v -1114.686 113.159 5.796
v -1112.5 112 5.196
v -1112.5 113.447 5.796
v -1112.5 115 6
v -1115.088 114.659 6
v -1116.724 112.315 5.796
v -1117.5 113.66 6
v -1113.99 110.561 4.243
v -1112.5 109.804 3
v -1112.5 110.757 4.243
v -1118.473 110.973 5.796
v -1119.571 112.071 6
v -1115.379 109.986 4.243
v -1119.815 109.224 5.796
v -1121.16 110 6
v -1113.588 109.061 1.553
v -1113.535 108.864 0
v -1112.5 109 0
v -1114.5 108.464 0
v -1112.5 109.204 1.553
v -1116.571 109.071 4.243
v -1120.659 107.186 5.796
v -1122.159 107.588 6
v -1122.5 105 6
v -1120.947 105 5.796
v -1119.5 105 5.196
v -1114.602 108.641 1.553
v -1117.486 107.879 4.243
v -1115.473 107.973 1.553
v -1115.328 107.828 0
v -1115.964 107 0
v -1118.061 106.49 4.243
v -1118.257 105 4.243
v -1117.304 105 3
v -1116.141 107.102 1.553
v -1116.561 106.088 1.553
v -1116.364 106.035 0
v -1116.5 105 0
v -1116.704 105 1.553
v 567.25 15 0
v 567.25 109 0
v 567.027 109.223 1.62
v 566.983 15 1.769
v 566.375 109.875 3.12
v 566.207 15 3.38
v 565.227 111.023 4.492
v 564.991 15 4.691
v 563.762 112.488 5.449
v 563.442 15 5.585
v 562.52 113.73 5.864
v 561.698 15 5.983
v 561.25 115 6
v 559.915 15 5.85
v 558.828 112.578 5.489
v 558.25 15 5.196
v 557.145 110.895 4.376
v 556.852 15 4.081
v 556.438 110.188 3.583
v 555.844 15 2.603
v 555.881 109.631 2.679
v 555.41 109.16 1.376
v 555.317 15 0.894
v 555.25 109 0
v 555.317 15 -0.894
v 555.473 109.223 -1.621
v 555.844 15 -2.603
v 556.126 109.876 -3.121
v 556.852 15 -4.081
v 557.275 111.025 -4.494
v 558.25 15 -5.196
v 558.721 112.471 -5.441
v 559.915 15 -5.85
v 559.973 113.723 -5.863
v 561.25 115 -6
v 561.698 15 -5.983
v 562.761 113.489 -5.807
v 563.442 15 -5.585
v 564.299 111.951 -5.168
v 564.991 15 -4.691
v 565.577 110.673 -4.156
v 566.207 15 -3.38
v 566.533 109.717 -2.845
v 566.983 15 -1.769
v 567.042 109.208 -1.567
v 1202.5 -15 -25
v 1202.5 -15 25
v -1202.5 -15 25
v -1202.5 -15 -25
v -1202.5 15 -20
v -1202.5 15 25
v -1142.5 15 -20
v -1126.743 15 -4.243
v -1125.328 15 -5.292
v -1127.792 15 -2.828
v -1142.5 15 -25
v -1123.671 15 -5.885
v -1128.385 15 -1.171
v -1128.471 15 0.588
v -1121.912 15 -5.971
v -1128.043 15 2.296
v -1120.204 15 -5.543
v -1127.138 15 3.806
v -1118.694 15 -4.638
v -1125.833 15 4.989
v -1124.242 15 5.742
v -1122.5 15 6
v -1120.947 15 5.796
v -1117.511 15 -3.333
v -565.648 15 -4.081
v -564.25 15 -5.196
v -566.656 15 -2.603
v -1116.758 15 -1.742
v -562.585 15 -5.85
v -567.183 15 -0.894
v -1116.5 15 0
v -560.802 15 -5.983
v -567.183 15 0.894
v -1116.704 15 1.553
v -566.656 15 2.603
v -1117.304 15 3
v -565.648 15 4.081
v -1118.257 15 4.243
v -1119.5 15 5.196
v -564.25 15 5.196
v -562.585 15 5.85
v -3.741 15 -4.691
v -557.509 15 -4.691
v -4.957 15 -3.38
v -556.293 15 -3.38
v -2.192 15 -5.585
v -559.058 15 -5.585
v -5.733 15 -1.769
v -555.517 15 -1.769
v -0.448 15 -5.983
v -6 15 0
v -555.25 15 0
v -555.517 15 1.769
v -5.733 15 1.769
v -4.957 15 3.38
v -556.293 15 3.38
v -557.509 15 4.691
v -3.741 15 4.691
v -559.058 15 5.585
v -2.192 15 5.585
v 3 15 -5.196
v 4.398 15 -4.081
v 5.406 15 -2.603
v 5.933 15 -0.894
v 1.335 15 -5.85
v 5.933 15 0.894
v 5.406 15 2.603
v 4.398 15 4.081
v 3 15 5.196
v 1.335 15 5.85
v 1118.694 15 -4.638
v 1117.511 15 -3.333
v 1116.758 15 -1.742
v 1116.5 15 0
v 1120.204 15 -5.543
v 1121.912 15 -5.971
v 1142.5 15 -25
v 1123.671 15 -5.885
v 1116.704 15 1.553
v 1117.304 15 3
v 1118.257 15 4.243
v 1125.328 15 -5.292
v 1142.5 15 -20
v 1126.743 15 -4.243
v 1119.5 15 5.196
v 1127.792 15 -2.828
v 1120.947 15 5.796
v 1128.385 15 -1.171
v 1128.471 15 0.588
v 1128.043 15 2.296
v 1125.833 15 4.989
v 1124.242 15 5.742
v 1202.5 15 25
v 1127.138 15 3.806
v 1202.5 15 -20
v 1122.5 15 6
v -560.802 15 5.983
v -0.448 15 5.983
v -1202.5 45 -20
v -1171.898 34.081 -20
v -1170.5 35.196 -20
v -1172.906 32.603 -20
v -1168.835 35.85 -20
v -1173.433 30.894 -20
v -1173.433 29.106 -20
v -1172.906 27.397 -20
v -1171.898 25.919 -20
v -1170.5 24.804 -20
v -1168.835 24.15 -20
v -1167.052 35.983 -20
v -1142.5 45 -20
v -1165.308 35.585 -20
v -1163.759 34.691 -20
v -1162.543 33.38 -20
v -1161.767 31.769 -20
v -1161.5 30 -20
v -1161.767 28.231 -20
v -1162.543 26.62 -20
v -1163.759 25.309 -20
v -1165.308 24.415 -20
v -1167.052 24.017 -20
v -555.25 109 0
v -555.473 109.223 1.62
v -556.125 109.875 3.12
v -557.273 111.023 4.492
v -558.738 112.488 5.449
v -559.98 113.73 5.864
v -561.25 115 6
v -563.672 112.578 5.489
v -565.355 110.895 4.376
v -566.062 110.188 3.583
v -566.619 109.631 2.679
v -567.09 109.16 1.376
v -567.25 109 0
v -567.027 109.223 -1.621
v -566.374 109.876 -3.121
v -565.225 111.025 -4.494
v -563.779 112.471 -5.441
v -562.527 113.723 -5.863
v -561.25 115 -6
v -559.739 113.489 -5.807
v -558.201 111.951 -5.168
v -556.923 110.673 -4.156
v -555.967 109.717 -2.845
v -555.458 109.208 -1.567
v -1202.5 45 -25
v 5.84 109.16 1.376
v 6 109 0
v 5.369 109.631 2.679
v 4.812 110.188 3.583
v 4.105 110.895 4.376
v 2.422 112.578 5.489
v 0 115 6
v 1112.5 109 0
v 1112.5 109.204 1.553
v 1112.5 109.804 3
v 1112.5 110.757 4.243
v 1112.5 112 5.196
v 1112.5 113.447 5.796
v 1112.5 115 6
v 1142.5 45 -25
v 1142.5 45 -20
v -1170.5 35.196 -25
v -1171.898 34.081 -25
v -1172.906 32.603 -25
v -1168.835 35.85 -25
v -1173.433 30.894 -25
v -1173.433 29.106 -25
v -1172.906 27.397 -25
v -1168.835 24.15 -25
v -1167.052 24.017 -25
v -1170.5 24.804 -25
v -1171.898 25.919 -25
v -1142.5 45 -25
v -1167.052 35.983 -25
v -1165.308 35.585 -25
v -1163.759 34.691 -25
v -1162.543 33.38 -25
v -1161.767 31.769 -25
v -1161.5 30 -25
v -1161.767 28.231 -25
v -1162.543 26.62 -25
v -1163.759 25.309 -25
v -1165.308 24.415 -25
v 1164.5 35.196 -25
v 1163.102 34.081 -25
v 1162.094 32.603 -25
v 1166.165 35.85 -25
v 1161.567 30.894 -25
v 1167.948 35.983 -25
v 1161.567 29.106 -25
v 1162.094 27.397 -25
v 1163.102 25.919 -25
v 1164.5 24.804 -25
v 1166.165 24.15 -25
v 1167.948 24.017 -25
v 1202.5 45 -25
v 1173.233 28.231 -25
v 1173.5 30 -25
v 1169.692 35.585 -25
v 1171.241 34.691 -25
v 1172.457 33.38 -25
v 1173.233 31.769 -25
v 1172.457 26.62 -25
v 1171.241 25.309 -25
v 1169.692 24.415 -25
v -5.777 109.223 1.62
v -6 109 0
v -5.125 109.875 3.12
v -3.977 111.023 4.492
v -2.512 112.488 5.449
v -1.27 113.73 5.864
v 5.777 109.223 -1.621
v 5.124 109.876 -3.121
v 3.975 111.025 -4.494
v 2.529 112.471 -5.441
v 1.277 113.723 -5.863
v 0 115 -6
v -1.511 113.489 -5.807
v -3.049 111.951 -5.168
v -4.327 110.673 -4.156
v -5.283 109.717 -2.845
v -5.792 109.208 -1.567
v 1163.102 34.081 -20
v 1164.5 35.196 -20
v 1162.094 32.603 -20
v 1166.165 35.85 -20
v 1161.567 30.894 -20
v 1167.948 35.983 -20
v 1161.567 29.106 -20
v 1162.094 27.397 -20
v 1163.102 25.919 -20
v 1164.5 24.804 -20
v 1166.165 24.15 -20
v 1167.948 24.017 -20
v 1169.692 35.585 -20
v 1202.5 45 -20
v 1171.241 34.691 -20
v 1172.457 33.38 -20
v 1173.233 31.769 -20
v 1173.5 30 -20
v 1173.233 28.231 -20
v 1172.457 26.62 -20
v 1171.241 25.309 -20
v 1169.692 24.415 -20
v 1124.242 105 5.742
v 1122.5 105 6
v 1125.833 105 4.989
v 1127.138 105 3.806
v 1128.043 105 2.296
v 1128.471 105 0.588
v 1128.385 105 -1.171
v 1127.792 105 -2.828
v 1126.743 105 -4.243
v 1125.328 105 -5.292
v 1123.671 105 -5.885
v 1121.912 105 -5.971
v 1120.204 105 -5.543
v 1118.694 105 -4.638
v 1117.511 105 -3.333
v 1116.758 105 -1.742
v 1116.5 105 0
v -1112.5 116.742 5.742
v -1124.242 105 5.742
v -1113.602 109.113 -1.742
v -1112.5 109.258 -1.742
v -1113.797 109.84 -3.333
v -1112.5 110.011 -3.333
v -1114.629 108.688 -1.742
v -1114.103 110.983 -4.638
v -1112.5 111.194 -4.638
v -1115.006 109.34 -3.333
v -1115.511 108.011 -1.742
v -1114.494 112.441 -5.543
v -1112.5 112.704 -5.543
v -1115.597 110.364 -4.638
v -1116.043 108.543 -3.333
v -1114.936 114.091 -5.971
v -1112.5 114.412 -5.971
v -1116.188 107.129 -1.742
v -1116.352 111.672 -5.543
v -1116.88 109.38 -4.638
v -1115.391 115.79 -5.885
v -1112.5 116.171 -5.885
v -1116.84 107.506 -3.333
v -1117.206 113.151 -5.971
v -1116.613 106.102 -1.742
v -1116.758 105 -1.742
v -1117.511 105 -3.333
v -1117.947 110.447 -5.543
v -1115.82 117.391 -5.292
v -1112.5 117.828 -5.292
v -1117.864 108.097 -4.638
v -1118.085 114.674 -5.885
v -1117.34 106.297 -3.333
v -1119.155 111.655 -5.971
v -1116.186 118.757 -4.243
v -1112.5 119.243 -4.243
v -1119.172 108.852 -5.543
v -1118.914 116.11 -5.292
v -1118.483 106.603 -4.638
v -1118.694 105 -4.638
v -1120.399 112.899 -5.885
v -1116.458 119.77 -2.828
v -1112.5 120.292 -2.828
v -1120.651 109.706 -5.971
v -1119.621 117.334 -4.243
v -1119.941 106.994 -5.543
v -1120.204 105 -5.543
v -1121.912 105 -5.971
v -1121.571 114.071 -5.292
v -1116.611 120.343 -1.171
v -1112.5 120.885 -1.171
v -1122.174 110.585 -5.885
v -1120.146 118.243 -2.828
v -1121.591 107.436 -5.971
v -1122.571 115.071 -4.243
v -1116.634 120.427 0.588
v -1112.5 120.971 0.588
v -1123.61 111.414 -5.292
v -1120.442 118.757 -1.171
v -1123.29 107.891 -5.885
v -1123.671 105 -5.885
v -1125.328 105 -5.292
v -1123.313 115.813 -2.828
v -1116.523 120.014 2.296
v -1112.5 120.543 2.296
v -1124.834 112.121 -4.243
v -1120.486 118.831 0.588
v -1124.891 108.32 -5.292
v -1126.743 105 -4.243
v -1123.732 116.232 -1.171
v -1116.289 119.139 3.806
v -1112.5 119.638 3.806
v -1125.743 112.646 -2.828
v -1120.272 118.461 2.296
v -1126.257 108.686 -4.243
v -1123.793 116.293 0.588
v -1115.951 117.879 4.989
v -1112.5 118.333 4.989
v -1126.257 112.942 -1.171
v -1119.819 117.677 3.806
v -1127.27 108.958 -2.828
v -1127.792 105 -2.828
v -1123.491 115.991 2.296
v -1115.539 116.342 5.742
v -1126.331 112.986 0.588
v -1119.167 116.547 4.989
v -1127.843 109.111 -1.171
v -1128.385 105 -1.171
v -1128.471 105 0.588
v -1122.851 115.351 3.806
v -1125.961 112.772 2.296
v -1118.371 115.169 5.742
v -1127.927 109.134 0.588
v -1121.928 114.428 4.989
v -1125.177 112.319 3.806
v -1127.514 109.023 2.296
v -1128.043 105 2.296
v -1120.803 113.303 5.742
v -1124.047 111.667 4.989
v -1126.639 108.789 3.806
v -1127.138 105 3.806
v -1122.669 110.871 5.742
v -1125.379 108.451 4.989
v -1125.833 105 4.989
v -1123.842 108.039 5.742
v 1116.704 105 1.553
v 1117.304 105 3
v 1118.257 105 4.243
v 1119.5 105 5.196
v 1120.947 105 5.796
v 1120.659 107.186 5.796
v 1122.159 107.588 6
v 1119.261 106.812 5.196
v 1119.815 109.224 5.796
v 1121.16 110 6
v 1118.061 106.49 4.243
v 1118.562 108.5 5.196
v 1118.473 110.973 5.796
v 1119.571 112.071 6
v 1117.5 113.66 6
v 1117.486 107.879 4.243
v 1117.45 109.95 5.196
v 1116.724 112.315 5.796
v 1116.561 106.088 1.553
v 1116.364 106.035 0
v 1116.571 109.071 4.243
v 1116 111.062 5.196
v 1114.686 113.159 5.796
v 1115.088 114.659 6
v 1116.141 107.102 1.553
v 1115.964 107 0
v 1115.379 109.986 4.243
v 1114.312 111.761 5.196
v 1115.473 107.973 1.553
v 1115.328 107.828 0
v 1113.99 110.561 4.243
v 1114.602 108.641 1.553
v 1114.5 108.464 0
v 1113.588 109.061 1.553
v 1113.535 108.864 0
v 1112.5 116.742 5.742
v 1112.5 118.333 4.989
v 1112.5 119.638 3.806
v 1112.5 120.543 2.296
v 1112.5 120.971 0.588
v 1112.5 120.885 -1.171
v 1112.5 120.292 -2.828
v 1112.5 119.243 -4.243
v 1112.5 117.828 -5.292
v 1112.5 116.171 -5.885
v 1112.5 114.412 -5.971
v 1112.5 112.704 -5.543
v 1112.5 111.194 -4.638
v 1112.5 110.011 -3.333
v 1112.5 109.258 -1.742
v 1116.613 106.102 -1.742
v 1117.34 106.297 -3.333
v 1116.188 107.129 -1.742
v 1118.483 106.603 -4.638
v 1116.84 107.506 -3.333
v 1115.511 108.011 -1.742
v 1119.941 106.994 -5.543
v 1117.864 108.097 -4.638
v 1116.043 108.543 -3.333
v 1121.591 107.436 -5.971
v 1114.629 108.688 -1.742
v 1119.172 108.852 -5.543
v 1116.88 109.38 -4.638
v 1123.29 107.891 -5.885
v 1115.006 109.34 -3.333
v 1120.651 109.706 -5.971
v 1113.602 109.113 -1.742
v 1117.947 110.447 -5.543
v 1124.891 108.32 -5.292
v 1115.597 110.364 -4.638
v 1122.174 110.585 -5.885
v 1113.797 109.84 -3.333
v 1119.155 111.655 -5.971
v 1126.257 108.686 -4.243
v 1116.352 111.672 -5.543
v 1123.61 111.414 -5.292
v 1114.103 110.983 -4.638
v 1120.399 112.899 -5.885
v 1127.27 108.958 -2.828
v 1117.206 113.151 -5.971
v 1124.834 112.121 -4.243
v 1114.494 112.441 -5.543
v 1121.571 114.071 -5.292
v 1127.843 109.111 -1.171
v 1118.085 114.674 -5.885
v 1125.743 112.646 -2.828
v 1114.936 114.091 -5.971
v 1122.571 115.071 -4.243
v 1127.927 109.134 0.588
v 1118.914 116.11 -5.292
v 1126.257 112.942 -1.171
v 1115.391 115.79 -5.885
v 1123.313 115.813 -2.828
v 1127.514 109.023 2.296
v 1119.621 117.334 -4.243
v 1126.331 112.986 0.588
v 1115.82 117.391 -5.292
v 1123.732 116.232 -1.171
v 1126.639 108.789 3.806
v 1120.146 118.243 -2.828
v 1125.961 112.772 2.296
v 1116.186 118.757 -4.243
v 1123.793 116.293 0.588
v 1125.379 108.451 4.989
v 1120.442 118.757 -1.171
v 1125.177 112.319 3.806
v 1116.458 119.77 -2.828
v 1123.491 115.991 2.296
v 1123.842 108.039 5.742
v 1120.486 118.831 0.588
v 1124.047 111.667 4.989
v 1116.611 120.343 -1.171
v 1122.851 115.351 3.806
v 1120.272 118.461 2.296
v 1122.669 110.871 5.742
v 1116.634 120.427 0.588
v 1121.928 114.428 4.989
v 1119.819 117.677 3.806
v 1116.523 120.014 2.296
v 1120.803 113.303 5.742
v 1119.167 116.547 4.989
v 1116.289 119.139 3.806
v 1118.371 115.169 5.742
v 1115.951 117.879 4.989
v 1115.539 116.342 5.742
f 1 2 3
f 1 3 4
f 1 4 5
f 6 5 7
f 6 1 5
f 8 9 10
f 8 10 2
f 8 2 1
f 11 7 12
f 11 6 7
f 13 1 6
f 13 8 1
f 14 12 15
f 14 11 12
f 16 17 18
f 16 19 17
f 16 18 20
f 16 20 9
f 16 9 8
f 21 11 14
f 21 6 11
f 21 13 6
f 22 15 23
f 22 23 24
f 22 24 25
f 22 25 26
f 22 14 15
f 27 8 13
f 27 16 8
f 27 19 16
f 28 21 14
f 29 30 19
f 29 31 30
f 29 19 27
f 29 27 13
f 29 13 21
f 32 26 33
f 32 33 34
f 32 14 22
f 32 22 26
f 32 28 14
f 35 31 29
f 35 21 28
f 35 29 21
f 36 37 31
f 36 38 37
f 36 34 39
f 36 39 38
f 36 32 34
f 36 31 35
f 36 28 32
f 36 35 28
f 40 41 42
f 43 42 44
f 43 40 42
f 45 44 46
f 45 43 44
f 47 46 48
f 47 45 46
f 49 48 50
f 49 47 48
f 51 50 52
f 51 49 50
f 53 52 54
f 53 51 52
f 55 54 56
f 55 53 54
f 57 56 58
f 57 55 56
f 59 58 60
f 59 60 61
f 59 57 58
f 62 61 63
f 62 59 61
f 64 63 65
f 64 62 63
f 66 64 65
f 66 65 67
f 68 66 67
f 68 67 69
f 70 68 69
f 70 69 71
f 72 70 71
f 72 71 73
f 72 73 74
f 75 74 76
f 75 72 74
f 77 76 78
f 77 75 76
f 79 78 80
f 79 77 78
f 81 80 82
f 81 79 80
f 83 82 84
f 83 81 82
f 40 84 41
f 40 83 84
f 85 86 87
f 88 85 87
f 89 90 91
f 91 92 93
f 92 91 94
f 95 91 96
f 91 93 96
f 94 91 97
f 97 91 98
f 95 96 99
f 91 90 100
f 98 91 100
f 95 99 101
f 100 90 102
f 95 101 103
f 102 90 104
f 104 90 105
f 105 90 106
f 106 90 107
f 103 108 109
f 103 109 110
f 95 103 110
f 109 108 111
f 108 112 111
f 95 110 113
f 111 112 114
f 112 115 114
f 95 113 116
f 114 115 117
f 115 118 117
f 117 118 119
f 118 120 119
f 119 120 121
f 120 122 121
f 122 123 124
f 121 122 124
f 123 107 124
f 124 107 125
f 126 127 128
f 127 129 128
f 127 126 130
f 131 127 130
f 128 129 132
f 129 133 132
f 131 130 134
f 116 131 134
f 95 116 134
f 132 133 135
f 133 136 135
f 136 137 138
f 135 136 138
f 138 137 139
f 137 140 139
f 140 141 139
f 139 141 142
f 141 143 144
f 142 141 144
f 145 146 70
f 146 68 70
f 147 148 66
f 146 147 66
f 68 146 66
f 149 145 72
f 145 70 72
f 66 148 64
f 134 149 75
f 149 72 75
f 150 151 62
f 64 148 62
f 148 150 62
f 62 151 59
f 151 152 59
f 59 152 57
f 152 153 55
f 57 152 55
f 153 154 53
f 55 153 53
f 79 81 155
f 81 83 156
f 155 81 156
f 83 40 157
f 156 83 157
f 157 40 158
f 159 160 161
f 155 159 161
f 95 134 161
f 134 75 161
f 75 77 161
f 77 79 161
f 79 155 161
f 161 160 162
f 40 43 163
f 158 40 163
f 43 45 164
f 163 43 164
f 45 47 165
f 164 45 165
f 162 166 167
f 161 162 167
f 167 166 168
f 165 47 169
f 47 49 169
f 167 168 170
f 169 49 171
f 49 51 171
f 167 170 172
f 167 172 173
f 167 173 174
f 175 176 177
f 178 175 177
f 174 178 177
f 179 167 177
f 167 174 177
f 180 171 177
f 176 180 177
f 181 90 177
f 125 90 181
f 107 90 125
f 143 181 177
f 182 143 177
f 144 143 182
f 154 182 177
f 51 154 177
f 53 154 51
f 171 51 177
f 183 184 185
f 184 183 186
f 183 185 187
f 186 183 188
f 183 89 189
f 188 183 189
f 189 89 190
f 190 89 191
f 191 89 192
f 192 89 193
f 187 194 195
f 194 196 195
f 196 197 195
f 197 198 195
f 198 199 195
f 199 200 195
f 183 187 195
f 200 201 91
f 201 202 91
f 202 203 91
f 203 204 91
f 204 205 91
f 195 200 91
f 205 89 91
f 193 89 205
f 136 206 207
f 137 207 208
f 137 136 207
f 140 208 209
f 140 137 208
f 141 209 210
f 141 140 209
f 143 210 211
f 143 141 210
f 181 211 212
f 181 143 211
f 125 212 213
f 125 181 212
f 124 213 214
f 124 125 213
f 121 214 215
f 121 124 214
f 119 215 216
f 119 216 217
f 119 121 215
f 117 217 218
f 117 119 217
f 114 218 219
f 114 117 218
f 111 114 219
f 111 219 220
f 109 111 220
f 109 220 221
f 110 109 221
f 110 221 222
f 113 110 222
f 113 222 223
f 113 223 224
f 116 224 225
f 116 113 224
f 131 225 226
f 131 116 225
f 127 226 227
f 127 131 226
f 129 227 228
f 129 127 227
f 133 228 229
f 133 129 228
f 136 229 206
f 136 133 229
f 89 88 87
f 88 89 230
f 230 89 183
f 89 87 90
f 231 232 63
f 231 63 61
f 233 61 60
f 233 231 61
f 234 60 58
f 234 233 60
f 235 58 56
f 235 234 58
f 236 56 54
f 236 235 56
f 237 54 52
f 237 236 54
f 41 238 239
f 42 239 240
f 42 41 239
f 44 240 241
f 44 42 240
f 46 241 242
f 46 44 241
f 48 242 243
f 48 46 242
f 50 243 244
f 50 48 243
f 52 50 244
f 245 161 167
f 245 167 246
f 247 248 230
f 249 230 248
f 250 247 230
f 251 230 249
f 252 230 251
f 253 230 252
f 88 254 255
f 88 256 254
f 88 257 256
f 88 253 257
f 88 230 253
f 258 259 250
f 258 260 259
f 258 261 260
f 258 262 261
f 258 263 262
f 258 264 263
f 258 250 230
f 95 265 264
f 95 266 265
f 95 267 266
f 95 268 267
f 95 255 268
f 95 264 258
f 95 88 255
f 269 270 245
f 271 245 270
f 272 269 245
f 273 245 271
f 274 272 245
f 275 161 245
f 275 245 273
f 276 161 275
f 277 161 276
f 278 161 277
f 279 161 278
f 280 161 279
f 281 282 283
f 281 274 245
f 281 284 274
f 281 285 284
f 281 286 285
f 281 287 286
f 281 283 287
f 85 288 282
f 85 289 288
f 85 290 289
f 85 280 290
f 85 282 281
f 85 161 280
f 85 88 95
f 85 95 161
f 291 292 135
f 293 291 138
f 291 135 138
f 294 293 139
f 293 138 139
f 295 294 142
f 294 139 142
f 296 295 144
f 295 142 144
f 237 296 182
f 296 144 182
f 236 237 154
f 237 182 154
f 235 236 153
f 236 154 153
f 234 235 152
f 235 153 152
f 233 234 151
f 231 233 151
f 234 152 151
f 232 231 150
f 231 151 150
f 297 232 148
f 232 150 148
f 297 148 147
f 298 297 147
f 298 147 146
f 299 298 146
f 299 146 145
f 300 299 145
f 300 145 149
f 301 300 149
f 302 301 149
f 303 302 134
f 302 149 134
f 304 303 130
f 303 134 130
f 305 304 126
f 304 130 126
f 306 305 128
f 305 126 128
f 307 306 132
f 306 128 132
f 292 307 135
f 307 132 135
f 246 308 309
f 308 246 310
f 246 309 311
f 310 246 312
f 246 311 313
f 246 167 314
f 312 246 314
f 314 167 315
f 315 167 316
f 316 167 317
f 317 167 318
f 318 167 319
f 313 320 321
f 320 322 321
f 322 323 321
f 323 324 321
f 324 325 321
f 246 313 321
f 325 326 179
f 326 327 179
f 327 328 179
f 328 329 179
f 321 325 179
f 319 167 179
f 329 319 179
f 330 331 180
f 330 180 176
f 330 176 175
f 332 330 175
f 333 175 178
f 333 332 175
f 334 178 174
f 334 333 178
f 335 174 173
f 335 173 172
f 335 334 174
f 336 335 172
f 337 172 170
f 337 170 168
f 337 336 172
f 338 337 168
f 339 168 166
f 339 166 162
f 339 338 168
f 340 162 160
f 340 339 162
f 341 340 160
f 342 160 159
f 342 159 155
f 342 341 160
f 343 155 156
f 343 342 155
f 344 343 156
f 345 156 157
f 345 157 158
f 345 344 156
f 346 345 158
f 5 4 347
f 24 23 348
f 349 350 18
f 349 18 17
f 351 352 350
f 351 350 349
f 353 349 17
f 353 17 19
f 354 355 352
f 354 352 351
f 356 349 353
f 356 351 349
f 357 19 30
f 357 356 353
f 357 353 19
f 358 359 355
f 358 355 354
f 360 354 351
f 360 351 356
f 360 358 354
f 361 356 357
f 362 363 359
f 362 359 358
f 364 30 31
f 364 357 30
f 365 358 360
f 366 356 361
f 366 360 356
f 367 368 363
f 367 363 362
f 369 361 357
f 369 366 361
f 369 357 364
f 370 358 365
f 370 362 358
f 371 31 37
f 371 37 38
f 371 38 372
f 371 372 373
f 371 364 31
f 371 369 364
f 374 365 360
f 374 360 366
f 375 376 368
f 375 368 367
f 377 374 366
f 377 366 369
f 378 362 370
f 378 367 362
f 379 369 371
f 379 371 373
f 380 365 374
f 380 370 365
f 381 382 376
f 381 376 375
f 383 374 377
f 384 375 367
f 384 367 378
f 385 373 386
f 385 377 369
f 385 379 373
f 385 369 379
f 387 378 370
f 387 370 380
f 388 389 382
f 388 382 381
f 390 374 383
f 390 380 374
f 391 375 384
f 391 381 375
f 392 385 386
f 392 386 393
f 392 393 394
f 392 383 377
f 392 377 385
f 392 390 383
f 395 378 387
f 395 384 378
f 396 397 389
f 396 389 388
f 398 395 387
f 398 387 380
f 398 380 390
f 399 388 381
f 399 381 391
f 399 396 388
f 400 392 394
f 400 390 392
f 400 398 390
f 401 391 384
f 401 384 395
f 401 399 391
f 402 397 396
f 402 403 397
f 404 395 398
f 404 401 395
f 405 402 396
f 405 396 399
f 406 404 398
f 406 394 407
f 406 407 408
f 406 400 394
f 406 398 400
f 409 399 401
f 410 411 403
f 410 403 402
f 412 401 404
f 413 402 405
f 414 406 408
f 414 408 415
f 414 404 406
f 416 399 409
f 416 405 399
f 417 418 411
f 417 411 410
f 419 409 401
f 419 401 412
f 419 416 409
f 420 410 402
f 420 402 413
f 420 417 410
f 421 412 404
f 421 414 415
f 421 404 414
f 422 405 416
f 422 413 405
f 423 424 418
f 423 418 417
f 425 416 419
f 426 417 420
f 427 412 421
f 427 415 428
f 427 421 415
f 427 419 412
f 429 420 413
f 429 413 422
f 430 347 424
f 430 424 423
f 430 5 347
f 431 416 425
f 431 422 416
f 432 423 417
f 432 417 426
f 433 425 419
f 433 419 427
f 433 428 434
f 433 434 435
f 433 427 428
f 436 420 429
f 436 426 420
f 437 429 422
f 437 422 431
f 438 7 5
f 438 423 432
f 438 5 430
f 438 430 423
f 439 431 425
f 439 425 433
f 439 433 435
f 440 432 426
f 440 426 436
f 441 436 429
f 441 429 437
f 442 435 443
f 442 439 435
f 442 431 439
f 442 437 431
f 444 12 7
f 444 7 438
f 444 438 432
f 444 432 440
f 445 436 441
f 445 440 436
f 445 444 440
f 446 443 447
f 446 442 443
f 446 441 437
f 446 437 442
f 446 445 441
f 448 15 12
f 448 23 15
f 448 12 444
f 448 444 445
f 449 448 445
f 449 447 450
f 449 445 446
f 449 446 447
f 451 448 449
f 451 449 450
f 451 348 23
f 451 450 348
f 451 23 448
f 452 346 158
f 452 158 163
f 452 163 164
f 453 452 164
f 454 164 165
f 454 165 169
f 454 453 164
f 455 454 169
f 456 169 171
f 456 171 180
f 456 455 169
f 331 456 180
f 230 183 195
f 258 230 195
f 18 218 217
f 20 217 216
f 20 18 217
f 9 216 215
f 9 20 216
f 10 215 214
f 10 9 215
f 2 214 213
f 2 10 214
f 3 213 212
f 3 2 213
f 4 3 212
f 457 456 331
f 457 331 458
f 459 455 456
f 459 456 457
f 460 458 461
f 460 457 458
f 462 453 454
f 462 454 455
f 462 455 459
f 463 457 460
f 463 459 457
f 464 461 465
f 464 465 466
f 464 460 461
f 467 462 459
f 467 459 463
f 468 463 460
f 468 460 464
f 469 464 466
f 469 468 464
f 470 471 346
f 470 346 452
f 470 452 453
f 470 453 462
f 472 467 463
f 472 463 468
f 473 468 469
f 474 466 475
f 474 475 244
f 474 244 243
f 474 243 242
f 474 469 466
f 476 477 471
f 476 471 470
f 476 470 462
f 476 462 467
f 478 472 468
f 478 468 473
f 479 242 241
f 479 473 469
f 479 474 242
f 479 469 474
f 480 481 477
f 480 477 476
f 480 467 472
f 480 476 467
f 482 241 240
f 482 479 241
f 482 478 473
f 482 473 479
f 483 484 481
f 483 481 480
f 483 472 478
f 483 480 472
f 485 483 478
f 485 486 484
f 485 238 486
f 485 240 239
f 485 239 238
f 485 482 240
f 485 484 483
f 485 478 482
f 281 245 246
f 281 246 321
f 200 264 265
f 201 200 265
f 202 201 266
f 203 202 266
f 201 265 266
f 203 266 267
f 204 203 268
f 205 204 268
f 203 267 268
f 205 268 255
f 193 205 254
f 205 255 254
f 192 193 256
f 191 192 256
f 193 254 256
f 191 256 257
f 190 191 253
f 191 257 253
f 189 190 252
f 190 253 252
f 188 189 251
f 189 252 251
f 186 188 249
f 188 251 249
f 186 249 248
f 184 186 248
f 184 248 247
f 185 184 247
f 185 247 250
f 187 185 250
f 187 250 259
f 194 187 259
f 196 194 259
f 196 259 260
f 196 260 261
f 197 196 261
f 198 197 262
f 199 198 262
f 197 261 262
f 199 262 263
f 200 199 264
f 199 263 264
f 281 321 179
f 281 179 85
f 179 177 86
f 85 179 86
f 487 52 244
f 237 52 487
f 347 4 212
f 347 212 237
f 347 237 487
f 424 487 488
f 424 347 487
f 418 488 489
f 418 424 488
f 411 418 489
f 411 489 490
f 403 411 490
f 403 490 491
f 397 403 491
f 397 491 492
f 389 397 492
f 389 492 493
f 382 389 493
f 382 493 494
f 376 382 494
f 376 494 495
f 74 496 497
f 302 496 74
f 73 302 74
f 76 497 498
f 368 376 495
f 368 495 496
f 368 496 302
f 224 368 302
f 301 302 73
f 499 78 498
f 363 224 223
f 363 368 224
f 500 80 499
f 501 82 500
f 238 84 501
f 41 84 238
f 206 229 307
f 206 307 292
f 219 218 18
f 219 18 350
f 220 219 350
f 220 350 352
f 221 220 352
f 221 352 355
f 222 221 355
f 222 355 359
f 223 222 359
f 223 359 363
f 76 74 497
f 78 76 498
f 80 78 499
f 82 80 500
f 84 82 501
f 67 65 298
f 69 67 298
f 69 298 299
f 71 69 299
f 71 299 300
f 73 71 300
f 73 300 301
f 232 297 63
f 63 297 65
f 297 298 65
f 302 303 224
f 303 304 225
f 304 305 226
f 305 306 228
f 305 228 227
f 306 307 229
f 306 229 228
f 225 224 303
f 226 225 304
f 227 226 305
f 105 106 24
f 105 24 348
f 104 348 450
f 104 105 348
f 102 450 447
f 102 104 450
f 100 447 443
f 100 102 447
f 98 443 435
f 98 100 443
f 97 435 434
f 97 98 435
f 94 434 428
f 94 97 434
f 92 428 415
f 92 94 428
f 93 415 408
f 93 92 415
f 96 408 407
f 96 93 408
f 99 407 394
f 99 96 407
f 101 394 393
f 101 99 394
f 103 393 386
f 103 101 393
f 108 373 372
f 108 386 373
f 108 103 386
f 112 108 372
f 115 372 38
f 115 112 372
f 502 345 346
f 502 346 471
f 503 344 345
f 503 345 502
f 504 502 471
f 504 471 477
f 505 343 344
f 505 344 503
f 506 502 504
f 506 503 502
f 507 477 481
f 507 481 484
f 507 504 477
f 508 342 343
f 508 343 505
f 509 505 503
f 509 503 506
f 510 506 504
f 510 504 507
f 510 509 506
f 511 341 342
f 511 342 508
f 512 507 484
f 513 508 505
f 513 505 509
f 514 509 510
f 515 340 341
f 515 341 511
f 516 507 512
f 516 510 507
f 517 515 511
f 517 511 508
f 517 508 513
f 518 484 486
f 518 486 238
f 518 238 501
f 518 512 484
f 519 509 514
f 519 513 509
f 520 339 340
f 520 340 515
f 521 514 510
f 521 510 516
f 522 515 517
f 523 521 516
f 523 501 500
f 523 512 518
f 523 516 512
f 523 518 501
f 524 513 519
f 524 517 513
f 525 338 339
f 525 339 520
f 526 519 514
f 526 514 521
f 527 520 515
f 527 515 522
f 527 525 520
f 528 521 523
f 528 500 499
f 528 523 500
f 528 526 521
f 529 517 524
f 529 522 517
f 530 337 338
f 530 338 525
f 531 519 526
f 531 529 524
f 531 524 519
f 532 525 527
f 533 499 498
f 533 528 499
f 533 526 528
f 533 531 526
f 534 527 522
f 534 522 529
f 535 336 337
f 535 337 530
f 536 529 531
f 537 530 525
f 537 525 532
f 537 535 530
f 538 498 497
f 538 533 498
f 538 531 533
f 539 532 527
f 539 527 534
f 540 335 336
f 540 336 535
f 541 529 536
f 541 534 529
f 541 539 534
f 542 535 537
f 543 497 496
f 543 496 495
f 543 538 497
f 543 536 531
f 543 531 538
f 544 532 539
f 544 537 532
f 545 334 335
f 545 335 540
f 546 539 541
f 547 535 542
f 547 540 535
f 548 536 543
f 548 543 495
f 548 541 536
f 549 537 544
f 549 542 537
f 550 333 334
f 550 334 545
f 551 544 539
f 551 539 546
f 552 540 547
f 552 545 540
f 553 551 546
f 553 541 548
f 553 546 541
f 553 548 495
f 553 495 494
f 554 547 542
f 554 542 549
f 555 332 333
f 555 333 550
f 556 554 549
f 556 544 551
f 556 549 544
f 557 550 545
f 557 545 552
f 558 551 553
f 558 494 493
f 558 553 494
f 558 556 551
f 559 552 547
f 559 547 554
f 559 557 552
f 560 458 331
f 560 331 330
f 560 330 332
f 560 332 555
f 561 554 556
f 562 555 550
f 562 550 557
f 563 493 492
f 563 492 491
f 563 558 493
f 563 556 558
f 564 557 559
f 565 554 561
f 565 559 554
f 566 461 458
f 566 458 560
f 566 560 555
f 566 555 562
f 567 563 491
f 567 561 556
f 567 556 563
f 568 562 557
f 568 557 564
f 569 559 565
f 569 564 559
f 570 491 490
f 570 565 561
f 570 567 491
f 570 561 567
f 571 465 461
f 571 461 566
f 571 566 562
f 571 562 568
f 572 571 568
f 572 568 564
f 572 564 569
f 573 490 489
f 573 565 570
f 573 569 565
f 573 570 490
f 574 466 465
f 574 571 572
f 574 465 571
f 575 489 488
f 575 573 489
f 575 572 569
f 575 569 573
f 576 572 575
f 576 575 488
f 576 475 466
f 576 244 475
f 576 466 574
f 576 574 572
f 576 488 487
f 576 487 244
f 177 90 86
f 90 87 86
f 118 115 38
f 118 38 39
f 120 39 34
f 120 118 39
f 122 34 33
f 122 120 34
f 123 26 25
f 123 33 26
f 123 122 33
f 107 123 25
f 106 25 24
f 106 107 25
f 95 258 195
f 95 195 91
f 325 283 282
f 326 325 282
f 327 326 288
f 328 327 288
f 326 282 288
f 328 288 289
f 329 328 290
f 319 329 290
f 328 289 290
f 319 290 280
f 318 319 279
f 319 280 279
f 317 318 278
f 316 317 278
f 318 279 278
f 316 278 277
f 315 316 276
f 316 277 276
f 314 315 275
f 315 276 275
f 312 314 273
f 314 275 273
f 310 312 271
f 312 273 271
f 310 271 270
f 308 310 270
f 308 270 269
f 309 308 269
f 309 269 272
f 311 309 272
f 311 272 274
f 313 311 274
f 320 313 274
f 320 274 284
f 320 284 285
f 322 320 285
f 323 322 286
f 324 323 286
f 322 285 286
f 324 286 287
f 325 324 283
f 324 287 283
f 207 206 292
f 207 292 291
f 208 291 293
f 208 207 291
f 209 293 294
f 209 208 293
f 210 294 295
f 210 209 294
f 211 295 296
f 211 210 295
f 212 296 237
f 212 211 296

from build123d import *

# Parameters (mm, degrees)
F0_W          = 2405
F0_H          = 50
F1_DEPTH      = 15
F1_DEPTH_BACK = 15
F2_W          = 60
F2_H          = 30
F3_DEPTH      = 5
F4_W          = 60
F4_H          = 30
F5_DEPTH      = 5
F6_R          = 6
F7_DEPTH      = 5
F9_DEPTH      = 5
F10_DEPTH     = 5
F11_DEPTH     = 5


# Not quite as in the source:
# - a feature of the source that left no trace in its solid (it failed there, or was rolled back) is left out
# - a pattern or mirror of a feature is missing from the dataset's text; its kind, count and spacing are read off the source's solid
# - a feature names something its author has since deleted; it is built from what else it names


with BuildPart() as f1:
    # F0 (on Front) → F1 (new body, two sides)
    with BuildSketch(Plane.XZ) as f1_sk:
        Rectangle(F0_W, F0_H)
    extrude(amount=F1_DEPTH)
    extrude(f1_sk.sketch, amount=-F1_DEPTH_BACK)

    # F2 (on face) → F3 (join)
    with BuildSketch(Plane(origin=(0, 0, -25), x_dir=(1, 0, 0), z_dir=(0, 0, -1))):
        with Locations((-1172.5, -30)):
            Rectangle(F2_W, F2_H)
        Polygon((-1142.5, 15), (-1202.5, 15), (-1202.5, 0), (-1202.5, -15), (-1142.5, -15), align=None)
    extrude(amount=F3_DEPTH)

    # F4 (on face) → F5 (join)
    with BuildSketch(Plane(origin=(0, 0, -25), x_dir=(1, 0, 0), z_dir=(0, 0, -1))):
        with Locations((1172.5, -30)):
            Rectangle(F4_W, F4_H)
        Polygon((1202.5, 0), (1202.5, 15), (1142.5, 15), (1142.5, -15), (1202.5, -15), align=None)
    extrude(amount=F5_DEPTH)

    # F6 (on face) → F7 (cut, through all)
    with BuildSketch(Plane(origin=(0, 0, -30), x_dir=(1, 0, 0), z_dir=(0, 0, -1))):
        with Locations((1167.5, -30)):
            Circle(F6_R)
    extrude(amount=-F7_DEPTH, mode=Mode.SUBTRACT)

    # F8 (on face) → F9 (cut, through all)
    with BuildSketch(Plane(origin=(0, 0, -30), x_dir=(1, 0, 0), z_dir=(0, 0, -1))):
        with BuildLine():
            ThreePointArc((-1173.5, -30), (-1167.5, -36), (-1161.5, -30))
            ThreePointArc((-1161.5, -30), (-1167.5, -24), (-1173.5, -30))
        make_face()
    extrude(amount=-F9_DEPTH, mode=Mode.SUBTRACT)

    # F10 (add): faces of the model
    f10_faces = [f1.faces().sort_by_distance(p)[0] for p in [
        (1172.5, 44.3291796068, -25),
        (-1201.8291796068, 30, -25),
    ]]
    extrude(f10_faces, amount=F10_DEPTH)

    # F11 (cut): faces of the model
    f11_faces = [f1.faces().sort_by_distance(p)[0] for p in [
        (-1172.6621744947, 14.5134765159, -30),
        (1172.6621744947, 14.5134765159, -30),
    ]]
    extrude(f11_faces, amount=-F11_DEPTH, mode=Mode.SUBTRACT)

    # F14: sweep along a path in F13
    with BuildLine(Plane.XY) as f14_path:
        Line((1122.5, 15), (1122.5, 105))
        ThreePointArc((1122.5, 105), (1119.5710678119, 112.0710678119), (1112.5, 115))
        Line((1112.5, 115), (-1112.5, 115))
        ThreePointArc((-1112.5, 115), (-1119.5710678119, 112.0710678119), (-1122.5, 105))
        Line((-1122.5, 105), (-1122.5, 15))
    # F12 (on face) → F14 (sweep)
    with BuildSketch(Plane(origin=(0, 15, 0), x_dir=(-1, 0, 0), z_dir=(0, 1, 0))):
        with BuildLine():
            Line((-1122.5, 0), (-1122.5, 6))
            ThreePointArc((-1122.5, 6), (-1126.7426406871, -4.2426406871), (-1116.5, 0))
            Line((-1116.5, 0), (-1122.5, 0))
        make_face()
        with BuildLine():
            ThreePointArc((-1116.5, 0), (-1118.2573593129, 4.2426406871), (-1122.5, 6))
            Line((-1122.5, 6), (-1122.5, 0))
            Line((-1122.5, 0), (-1116.5, 0))
        make_face()
    sweep(path=f14_path.line)

    # F15: sweep along a path in F13
    with BuildLine(Plane.XY) as f15_path:
        Line((-561.25, 115), (-561.25, 15))
    # F12 (on face) → F15 (sweep)
    with BuildSketch(Plane(origin=(0, 15, 0), x_dir=(-1, 0, 0), z_dir=(0, 1, 0))):
        with BuildLine():
            ThreePointArc((567.25, 0), (561.25, 6), (555.25, 0))
            Line((555.25, 0), (567.25, 0))
        make_face()
        with BuildLine():
            Line((567.25, 0), (555.25, 0))
            ThreePointArc((555.25, 0), (561.25, -6), (567.25, 0))
        make_face()
    f15 = sweep(path=f15_path.line)

    # F15_copies: F15 across plane
    add(f15.mirror(Plane(origin=(-280.625, 0, 0), x_dir=(0, 0, 1), z_dir=(1, 0, 0))))

    # F17: sweep along a path in F13
    with BuildLine(Plane.XY) as f17_path:
        Line((561.25, 115), (561.25, 15))
    # F12 (on face) → F17 (sweep)
    with BuildSketch(Plane(origin=(0, 15, 0), x_dir=(-1, 0, 0), z_dir=(0, 1, 0))):
        with BuildLine():
            ThreePointArc((-555.25, 0), (-561.25, 6), (-567.25, 0))
            Line((-567.25, 0), (-555.25, 0))
        make_face()
        with BuildLine():
            Line((-555.25, 0), (-567.25, 0))
            ThreePointArc((-567.25, 0), (-561.25, -6), (-555.25, 0))
        make_face()
    sweep(path=f17_path.line)


solid = f1.part
